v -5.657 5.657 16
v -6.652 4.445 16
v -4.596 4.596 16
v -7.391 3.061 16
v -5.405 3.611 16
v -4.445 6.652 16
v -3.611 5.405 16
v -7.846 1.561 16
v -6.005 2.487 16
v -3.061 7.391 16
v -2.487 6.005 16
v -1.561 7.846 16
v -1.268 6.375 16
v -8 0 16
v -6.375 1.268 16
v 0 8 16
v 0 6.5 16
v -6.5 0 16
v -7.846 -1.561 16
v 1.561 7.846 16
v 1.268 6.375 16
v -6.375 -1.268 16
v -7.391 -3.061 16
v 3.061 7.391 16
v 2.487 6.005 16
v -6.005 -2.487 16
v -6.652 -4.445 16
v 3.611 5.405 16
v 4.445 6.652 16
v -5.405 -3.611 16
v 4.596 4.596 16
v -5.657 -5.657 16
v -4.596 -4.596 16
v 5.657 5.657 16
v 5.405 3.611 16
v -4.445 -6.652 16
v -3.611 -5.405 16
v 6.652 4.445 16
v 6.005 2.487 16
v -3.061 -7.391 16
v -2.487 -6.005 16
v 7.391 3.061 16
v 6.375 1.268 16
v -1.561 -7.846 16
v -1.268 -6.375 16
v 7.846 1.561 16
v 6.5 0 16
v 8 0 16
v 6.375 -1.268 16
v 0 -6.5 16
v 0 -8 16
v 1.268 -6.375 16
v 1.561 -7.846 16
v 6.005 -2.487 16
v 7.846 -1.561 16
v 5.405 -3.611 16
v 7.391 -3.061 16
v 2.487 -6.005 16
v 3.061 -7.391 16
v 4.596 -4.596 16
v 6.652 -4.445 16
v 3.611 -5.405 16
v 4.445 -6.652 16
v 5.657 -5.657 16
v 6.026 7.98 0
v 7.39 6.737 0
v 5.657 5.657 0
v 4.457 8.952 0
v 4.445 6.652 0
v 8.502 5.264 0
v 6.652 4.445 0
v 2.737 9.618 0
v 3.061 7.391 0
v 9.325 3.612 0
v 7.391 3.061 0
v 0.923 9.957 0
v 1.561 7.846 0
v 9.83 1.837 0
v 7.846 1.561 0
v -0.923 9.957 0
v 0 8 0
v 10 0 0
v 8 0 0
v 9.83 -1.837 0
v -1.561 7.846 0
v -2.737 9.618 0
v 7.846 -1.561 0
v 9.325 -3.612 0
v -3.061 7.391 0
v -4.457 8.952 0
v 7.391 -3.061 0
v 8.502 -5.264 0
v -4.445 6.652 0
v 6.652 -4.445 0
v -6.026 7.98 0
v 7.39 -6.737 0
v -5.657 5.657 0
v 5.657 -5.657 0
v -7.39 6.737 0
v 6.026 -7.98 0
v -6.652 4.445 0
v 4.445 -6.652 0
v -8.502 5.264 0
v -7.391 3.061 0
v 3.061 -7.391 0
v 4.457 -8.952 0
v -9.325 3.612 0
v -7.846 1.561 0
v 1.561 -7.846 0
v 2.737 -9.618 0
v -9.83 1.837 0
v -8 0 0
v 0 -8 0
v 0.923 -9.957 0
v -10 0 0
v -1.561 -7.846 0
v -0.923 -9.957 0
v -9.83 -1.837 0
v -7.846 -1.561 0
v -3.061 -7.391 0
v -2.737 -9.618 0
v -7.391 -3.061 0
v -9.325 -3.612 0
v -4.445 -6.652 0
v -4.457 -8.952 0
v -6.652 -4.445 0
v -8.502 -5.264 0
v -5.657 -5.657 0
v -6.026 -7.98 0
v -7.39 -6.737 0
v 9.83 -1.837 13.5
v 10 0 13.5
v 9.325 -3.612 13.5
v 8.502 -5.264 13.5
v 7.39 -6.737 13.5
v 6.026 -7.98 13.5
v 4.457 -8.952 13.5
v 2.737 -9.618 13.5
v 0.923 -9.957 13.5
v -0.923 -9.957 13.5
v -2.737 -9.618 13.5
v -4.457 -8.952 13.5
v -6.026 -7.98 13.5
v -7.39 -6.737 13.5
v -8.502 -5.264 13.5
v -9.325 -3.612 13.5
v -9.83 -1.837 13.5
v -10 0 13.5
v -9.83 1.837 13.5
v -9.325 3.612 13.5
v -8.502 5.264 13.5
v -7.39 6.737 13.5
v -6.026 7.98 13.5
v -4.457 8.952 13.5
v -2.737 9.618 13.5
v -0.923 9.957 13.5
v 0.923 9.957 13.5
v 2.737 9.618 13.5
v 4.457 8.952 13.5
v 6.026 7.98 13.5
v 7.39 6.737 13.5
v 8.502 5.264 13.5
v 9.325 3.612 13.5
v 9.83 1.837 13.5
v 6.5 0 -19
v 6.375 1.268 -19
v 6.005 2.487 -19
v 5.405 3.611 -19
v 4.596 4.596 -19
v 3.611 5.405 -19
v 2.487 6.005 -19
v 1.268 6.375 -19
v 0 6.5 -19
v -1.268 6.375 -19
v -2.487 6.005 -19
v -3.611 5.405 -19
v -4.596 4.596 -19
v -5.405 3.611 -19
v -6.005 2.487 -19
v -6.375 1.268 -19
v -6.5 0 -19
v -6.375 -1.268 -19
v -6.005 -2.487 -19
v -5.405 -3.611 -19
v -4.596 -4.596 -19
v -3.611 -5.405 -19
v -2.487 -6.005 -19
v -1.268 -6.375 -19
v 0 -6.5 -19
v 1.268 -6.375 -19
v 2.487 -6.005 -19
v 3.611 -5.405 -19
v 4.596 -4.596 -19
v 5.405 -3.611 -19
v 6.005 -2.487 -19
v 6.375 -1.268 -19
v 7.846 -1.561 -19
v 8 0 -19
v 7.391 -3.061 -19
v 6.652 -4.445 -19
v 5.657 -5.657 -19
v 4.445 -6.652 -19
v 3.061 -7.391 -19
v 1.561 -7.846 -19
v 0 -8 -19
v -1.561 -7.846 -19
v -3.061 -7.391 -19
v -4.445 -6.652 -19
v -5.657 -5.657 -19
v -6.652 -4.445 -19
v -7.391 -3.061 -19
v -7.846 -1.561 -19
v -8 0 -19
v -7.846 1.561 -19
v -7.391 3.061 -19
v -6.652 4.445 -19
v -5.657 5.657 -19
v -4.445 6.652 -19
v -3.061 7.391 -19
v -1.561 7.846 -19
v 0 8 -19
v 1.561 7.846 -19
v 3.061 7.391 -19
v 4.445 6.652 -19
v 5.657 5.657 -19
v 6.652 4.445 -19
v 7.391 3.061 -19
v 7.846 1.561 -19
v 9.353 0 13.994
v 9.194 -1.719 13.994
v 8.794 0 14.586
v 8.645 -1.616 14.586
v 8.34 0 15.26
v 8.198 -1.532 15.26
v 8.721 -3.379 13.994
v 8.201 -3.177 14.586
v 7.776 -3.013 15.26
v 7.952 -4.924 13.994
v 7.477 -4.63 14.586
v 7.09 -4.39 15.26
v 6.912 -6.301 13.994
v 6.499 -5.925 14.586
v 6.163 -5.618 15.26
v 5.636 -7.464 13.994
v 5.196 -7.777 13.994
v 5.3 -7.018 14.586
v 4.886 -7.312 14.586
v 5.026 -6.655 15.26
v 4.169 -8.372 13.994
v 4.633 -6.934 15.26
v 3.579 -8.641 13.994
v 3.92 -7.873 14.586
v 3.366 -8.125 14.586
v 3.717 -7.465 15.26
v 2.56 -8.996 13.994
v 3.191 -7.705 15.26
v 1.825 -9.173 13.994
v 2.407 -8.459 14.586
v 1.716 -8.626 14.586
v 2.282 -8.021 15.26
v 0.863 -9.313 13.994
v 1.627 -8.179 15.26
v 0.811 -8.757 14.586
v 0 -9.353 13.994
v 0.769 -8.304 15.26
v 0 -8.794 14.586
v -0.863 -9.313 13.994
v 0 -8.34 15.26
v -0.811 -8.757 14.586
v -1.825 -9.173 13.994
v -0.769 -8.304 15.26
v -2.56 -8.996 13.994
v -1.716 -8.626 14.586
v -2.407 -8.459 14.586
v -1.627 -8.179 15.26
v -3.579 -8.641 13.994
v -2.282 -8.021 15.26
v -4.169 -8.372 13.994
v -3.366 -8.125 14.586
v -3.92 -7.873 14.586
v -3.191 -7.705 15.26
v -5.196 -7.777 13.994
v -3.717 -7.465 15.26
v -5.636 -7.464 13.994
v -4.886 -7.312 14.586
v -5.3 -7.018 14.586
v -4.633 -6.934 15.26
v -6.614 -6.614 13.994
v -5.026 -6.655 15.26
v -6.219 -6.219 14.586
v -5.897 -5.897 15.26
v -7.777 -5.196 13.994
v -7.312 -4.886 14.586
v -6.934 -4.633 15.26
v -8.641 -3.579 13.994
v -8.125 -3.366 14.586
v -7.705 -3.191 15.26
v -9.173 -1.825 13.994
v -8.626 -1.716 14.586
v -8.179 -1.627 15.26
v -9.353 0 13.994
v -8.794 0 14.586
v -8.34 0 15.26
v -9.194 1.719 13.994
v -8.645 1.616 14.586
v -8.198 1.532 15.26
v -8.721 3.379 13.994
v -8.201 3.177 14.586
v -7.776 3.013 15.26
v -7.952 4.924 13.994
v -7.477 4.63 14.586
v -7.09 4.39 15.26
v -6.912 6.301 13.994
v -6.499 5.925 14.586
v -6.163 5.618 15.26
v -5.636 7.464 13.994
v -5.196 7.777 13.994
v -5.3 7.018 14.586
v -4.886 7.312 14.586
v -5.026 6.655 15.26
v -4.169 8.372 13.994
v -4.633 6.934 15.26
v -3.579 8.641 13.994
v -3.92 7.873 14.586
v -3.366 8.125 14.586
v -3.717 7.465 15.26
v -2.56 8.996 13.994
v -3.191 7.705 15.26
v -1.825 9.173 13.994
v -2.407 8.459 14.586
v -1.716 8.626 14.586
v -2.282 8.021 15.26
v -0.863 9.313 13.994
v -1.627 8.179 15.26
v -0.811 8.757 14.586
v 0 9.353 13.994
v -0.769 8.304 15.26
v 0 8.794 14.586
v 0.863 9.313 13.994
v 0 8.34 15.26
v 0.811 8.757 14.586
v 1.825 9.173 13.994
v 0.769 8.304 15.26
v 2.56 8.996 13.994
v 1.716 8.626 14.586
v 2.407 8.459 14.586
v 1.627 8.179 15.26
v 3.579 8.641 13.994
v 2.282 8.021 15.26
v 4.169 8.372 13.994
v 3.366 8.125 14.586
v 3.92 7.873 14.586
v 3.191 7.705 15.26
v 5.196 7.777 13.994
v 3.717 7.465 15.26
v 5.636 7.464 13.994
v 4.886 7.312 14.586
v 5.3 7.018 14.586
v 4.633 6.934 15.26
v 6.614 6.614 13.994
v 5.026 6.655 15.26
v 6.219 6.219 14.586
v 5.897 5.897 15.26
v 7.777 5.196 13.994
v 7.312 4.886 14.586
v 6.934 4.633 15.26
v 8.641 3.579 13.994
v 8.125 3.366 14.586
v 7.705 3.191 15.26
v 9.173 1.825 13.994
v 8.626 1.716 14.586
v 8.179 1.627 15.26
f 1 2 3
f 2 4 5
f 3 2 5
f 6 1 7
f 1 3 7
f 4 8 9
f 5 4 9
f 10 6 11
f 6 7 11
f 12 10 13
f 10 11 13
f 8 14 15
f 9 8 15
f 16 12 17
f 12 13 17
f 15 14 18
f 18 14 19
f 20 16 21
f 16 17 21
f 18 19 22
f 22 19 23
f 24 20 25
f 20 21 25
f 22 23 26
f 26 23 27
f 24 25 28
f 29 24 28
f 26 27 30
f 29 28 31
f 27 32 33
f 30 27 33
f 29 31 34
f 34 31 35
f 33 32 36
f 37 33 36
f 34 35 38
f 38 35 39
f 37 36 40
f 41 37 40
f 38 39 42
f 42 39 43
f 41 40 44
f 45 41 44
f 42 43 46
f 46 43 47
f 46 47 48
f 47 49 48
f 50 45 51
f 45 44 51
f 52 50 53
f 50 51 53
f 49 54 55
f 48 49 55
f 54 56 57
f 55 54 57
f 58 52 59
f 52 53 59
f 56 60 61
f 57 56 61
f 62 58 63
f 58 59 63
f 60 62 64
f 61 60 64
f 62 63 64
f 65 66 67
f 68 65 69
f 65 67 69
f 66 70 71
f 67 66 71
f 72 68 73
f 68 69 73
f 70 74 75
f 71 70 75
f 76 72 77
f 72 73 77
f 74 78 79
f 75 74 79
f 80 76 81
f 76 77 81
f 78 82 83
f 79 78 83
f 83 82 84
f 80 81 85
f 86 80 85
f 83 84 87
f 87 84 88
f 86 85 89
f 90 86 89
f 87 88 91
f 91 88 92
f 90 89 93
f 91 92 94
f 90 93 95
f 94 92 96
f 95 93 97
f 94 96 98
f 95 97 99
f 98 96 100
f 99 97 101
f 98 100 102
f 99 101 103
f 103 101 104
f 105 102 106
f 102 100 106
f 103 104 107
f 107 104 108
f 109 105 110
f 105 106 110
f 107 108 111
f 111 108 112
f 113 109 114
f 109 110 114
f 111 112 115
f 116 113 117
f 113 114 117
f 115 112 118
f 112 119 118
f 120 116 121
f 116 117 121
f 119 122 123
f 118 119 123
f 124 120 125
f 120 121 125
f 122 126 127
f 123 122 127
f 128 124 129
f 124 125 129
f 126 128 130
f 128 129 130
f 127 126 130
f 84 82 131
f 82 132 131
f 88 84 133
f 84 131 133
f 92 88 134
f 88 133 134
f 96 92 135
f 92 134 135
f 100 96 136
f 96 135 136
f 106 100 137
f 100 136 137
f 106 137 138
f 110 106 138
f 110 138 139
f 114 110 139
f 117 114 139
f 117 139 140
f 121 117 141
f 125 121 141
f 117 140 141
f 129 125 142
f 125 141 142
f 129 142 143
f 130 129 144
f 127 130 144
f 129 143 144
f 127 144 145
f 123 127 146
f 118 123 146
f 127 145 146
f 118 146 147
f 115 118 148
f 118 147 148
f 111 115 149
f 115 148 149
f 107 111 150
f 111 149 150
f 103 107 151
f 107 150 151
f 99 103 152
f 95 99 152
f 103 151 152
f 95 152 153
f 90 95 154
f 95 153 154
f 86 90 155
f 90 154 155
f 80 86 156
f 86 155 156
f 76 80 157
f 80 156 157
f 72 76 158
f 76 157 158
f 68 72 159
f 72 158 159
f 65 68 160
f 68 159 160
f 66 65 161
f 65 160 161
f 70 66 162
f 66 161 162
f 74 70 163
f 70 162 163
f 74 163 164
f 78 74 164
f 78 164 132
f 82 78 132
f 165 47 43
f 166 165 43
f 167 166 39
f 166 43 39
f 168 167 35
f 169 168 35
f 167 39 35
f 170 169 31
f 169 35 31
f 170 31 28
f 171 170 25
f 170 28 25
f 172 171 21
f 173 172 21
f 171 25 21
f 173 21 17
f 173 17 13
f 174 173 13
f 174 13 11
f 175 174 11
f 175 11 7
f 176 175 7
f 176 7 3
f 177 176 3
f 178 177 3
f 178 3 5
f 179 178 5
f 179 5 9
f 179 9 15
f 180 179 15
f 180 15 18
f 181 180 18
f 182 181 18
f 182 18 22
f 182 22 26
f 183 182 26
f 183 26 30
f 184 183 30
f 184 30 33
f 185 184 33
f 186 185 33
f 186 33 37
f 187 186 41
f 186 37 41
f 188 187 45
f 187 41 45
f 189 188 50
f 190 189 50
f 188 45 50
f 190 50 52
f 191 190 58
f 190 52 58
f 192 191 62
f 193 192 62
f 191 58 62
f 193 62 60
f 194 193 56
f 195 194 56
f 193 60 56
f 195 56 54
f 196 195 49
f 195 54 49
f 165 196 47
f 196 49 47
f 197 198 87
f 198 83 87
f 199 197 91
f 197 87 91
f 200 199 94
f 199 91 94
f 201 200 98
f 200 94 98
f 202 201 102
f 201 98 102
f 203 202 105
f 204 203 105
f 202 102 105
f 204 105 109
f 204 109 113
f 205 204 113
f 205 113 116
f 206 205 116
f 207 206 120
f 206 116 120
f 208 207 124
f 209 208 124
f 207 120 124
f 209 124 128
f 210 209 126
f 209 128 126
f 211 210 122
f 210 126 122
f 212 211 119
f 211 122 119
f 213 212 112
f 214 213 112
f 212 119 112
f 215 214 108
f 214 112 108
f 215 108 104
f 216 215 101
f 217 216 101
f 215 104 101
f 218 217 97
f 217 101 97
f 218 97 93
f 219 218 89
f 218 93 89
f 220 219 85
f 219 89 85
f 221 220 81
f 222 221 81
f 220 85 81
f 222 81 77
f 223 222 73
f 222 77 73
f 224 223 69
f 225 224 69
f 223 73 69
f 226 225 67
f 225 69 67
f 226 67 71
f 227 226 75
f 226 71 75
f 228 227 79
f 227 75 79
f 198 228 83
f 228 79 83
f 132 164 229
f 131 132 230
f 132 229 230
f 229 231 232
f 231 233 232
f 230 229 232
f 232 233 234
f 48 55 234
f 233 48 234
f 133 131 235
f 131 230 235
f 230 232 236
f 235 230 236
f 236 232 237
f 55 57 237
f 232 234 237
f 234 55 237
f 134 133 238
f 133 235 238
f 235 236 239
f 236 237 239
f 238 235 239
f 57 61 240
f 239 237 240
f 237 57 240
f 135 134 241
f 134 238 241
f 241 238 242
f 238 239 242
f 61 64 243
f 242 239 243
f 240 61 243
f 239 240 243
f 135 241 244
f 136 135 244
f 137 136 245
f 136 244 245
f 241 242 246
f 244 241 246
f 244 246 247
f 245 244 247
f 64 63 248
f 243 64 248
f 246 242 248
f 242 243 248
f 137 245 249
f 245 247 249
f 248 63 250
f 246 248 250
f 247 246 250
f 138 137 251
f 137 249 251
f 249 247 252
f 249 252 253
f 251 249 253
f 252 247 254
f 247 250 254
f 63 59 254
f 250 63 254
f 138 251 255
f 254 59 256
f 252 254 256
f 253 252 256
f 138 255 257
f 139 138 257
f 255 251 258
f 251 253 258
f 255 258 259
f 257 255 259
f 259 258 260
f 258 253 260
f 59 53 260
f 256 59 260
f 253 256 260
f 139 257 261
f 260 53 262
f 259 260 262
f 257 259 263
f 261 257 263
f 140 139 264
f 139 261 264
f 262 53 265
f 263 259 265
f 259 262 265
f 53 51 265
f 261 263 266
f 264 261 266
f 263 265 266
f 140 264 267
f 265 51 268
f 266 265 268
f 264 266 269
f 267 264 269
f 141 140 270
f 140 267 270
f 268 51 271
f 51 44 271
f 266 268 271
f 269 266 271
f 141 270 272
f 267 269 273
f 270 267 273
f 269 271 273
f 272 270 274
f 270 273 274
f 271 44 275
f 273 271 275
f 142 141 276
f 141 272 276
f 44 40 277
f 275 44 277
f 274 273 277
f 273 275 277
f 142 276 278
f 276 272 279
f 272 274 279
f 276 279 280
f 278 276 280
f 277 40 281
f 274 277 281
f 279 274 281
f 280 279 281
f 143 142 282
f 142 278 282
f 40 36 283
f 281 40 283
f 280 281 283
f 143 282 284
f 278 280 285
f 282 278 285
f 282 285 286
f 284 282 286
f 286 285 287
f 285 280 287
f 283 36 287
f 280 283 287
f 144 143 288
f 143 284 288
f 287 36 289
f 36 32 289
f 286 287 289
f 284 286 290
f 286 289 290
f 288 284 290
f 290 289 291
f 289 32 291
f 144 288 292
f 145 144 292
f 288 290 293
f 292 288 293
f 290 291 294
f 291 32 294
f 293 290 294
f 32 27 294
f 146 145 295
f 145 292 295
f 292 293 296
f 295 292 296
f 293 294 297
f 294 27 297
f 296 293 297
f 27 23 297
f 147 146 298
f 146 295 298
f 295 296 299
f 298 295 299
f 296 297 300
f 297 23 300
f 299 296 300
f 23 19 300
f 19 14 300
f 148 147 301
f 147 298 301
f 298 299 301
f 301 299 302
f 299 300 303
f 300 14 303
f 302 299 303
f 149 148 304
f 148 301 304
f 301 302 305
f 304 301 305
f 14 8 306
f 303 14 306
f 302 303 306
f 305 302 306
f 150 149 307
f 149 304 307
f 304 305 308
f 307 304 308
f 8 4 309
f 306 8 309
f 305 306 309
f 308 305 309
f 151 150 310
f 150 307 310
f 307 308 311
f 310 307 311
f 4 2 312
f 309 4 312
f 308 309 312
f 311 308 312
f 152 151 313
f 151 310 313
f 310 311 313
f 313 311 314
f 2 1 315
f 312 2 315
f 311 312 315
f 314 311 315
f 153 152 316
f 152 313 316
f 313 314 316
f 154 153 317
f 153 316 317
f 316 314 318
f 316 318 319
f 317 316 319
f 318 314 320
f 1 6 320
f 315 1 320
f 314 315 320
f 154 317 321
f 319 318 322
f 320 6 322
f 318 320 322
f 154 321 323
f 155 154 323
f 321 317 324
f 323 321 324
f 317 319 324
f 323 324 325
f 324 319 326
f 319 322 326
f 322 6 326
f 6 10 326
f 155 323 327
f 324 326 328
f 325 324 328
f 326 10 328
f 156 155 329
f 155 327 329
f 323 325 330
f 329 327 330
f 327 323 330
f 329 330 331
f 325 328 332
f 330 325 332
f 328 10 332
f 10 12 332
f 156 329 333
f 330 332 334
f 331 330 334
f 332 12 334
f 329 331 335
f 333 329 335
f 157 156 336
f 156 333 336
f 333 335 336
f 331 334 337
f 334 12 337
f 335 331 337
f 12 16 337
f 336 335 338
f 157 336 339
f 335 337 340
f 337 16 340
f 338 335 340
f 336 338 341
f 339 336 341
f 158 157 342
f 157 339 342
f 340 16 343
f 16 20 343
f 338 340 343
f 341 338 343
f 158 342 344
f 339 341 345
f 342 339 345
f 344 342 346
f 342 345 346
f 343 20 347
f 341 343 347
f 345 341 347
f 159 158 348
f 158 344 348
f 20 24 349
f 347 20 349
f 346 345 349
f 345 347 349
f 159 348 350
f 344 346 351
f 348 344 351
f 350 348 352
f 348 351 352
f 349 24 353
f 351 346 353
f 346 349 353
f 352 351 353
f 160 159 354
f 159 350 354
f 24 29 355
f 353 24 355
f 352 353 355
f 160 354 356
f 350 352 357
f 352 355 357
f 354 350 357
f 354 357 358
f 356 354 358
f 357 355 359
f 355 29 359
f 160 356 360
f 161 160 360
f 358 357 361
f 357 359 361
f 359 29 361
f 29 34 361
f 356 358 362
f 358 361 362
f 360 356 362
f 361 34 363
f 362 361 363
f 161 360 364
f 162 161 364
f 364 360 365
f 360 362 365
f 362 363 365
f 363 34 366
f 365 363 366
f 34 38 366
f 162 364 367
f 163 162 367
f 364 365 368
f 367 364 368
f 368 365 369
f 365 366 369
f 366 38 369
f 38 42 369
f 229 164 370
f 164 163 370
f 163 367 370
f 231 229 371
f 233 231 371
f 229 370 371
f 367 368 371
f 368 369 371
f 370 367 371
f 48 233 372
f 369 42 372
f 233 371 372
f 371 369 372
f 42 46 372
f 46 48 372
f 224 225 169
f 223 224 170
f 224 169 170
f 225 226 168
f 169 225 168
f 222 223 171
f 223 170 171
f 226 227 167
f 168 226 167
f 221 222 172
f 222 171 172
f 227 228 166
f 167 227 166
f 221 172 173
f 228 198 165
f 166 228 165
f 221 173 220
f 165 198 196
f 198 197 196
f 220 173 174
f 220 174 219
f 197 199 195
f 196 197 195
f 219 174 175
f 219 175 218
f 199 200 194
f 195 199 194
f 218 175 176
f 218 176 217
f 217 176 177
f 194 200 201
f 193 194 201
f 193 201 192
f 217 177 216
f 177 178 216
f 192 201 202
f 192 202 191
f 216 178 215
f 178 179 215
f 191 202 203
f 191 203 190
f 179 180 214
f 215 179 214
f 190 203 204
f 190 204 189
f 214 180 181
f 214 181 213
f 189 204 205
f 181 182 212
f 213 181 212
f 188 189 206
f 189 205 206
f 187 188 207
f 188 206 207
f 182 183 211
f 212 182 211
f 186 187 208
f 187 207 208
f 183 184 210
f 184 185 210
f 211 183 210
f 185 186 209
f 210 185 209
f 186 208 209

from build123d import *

# Parameters (mm, degrees)
SKETCH_2_R          = 6.5
CUT_EXTRUDE_1_DEPTH = 38.749172176


with BuildPart() as part:
    # Эскиз1 → Повернуть1 (revolve)
    with BuildSketch(Plane(origin=(0, 0, 0), x_dir=(0, 0, -1), z_dir=(1, 0, 0)), mode=Mode.PRIVATE) as revolve_1_sk:
        with BuildLine():
            Line((0, 8), (0, 10))
            Line((0, 10), (-13.5, 10))
            ThreePointArc((-13.5, 10), (-14.58559515, 8.794493938), (-16, 8))
            Line((-16, 8), (-16, 0))
            Line((-16, 0), (19, 0))
            Line((19, 0), (19, 8))
            Line((19, 8), (0, 8))
        make_face()
    revolve(revolve_1_sk.sketch.rotate(Axis((0, 0, 16), (0, 0, -1)), 90), axis=Axis((0, 0, 16), (0, 0, -1)))

    # Эскиз2 → Вырез-Вытянуть1 (cut, through all)
    with BuildSketch(Plane.XY.offset(16)):
        Circle(SKETCH_2_R)
    extrude(amount=-CUT_EXTRUDE_1_DEPTH, mode=Mode.SUBTRACT)


solid = part.part
